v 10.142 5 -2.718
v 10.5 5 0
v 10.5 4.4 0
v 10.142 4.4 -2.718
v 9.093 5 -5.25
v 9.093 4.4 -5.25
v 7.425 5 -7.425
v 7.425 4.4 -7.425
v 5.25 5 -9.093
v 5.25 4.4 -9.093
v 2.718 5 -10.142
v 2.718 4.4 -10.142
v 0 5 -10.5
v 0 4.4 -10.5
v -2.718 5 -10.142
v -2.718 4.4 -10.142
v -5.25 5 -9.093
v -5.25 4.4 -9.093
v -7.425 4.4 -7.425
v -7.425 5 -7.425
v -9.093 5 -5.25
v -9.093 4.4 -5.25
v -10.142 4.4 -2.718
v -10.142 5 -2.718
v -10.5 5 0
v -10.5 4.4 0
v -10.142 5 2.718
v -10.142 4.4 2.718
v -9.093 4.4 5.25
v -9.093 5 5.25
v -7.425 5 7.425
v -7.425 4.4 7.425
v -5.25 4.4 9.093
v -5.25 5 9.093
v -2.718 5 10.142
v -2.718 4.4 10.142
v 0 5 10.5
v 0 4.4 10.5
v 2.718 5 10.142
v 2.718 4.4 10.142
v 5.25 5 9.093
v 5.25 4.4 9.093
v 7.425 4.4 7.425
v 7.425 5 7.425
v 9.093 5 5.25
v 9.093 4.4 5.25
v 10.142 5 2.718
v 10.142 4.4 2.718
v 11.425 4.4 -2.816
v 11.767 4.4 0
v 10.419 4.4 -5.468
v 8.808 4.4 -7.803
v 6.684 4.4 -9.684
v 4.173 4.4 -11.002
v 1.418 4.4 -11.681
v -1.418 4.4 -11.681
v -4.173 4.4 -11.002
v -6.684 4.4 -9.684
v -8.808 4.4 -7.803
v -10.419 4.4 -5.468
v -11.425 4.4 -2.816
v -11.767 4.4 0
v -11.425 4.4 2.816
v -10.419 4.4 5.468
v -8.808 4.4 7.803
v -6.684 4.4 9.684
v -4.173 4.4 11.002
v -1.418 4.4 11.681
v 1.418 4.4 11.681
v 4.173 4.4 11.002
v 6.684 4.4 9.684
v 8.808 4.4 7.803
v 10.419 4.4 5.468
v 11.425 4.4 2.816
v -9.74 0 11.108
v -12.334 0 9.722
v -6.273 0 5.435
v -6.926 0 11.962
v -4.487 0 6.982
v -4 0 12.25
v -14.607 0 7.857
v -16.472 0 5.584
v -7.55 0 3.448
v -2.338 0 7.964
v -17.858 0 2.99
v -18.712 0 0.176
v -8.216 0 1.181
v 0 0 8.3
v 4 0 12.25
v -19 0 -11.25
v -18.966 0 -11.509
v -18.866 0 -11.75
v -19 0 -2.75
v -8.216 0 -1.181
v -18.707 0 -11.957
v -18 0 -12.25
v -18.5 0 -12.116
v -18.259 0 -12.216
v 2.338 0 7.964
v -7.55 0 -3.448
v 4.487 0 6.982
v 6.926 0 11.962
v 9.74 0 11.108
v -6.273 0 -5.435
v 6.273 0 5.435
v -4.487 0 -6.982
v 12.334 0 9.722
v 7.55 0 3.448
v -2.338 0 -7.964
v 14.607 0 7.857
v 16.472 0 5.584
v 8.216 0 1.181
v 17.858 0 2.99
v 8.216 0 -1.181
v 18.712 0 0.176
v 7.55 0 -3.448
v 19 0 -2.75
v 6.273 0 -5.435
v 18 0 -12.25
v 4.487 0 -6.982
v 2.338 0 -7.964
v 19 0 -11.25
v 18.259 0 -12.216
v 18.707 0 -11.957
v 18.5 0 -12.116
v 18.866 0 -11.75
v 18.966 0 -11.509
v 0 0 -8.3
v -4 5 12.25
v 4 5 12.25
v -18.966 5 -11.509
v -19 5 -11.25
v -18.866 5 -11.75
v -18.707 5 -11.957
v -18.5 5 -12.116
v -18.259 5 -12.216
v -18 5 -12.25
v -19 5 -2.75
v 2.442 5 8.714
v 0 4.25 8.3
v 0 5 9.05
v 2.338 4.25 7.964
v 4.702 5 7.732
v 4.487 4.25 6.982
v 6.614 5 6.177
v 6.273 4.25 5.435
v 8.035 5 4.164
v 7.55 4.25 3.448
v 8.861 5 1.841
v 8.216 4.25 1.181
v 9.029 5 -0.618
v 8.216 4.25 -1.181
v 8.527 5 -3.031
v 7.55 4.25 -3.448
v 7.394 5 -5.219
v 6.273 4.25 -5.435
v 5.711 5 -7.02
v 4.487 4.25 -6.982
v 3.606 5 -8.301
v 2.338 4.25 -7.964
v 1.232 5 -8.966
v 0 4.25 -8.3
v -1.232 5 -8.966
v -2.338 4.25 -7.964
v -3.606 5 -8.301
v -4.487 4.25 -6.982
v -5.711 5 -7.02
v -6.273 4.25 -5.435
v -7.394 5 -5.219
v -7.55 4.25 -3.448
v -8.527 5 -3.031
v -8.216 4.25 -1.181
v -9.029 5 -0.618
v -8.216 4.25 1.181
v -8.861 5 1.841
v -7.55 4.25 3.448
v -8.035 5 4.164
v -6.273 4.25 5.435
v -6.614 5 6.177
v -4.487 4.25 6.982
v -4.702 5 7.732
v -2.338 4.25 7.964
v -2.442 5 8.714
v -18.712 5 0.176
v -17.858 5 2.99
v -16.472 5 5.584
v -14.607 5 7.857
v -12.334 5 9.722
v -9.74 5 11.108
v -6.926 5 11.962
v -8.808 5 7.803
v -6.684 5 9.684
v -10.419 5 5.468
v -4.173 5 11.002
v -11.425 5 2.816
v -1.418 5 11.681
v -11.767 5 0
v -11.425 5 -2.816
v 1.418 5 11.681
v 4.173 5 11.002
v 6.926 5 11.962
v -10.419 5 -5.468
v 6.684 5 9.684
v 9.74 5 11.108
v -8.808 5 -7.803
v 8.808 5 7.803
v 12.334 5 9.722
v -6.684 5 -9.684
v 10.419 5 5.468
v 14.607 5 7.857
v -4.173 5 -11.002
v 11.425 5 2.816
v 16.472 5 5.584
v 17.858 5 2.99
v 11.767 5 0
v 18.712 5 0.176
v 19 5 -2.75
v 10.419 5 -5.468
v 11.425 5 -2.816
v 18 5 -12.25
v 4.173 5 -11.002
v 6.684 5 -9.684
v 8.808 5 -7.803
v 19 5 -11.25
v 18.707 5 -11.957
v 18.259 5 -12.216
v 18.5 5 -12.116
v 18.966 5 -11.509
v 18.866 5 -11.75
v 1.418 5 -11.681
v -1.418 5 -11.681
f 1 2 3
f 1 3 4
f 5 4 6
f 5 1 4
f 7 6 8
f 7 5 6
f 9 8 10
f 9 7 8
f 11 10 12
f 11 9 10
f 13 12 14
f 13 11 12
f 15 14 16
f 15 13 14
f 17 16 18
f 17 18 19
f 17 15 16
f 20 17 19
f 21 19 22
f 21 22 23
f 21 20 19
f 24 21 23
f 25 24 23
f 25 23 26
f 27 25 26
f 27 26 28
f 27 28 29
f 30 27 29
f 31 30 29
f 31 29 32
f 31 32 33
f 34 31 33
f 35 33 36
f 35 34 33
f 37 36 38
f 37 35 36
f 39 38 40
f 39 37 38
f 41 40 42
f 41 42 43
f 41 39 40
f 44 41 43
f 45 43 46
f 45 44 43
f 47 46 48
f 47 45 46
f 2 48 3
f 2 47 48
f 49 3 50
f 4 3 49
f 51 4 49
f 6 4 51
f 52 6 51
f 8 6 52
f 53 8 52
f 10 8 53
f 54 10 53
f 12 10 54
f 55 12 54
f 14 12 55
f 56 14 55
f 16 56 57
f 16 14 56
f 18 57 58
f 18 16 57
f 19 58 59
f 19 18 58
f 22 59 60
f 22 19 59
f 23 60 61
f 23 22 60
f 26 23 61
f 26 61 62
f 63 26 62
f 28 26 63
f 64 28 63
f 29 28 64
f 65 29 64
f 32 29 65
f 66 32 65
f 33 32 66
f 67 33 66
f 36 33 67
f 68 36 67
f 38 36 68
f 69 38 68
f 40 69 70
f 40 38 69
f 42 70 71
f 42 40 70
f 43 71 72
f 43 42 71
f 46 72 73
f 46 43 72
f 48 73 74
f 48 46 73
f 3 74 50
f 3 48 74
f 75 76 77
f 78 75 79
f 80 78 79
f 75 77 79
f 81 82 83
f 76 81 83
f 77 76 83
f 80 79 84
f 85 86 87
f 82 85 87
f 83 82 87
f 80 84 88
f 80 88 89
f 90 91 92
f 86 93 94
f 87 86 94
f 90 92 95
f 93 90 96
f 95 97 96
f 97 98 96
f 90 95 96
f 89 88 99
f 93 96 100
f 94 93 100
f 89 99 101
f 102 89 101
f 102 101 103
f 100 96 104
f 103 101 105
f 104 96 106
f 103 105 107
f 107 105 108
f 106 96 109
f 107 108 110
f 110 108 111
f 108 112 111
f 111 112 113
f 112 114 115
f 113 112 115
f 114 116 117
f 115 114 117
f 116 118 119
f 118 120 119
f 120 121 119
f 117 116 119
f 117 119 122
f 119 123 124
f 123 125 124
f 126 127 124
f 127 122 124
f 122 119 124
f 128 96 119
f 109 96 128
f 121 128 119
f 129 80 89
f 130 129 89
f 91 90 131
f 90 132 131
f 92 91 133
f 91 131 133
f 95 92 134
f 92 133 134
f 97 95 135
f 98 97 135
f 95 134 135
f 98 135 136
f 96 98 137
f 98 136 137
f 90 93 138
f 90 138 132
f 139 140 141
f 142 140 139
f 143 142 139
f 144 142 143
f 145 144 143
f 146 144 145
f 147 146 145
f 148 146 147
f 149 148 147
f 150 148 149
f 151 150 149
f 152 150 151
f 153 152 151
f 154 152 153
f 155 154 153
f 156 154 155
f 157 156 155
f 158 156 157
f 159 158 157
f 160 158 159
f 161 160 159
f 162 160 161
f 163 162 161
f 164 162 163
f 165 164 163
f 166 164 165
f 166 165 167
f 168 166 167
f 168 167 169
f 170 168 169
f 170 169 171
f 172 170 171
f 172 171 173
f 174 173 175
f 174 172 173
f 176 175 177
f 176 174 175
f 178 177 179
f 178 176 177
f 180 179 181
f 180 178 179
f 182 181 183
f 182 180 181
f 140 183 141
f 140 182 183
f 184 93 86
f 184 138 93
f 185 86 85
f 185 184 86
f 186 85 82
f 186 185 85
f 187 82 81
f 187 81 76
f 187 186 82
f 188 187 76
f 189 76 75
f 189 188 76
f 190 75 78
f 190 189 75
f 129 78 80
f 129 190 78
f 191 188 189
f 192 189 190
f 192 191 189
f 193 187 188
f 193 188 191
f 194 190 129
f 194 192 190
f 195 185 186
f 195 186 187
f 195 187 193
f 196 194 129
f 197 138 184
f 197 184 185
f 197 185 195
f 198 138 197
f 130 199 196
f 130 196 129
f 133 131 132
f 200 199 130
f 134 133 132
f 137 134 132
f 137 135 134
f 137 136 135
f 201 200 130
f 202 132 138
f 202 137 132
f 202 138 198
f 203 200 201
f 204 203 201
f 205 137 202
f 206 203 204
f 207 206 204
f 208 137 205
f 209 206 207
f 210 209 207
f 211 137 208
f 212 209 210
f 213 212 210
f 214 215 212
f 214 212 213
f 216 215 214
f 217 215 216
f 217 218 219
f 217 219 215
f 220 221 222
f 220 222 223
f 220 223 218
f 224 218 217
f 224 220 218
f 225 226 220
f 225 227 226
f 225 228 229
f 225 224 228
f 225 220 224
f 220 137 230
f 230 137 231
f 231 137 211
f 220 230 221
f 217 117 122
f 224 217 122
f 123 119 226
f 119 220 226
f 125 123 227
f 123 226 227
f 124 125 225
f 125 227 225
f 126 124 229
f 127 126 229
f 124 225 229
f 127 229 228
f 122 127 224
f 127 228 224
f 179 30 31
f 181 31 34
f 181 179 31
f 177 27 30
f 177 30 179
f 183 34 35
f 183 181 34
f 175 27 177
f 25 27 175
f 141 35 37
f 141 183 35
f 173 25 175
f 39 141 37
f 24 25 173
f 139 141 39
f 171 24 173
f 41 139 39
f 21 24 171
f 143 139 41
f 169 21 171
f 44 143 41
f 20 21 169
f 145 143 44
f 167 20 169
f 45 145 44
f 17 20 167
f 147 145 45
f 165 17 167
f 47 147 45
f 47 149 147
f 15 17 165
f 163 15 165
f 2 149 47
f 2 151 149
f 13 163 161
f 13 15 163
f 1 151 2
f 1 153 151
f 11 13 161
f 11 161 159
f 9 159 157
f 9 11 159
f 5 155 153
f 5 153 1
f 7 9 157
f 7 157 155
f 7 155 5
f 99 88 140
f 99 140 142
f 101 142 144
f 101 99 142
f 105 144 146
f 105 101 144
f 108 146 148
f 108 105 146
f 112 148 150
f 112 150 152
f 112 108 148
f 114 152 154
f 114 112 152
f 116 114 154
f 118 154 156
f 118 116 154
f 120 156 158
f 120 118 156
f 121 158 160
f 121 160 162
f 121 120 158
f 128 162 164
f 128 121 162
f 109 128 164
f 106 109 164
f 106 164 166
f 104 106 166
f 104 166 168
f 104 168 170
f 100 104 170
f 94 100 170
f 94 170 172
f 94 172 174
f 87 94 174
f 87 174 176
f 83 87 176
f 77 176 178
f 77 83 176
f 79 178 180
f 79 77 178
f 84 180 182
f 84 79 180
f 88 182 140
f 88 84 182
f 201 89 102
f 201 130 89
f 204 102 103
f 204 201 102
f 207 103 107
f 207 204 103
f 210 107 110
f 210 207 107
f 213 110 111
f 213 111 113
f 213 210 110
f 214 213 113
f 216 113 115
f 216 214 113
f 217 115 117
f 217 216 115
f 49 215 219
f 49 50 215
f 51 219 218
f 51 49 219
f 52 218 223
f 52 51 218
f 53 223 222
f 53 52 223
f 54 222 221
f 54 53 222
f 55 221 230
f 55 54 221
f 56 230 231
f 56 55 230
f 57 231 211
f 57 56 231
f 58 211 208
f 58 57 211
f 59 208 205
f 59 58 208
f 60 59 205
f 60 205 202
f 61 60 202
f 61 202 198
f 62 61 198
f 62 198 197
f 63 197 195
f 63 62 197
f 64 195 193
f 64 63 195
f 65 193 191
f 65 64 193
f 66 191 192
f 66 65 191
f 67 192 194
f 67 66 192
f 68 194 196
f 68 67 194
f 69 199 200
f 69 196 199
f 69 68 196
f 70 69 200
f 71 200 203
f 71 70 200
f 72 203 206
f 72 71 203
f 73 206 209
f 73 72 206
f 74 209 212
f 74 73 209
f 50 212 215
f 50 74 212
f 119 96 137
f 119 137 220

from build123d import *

# Parameters (mm, degrees)
SKETCH1_W           = 38
SKETCH1_H           = 24.5
SKETCH1_R           = 8.3
BOSS_EXTRUDE1_DEPTH = 5
FILLET1_R           = 15
FILLET2_R           = 1
CHAMFER1_SIZE       = 0.75
SKETCH3_W           = 1.267094865
SKETCH3_H           = 1.151259449


with BuildPart() as part:
    # Sketch1 → Boss-Extrude1 (new body)
    with BuildSketch(Plane(origin=(0, 0, 0), x_dir=(1, 0, 0), z_dir=(0, 1, 0))):
        Rectangle(SKETCH1_W, SKETCH1_H)
        with Locations(Location((0, 0, 0), (0, 0, 270))):
            Circle(SKETCH1_R, mode=Mode.SUBTRACT)
    extrude(amount=BOSS_EXTRUDE1_DEPTH)

    # Fillet1
    fillet1_edges = [part.edges().sort_by_distance(p)[0] for p in [
        (19, 2.5, 12.25),
        (-19, 2.5, 12.25),
    ]]
    fillet(fillet1_edges, radius=FILLET1_R)

    # Fillet2
    fillet2_edges = [part.edges().sort_by_distance(p)[0] for p in [
        (-19, 2.5, -12.25),
        (19, 2.5, -12.25),
    ]]
    fillet(fillet2_edges, radius=FILLET2_R)

    # Chamfer1
    chamfer1_edges = [part.edges().sort_by_distance(p)[0] for p in [
        (0, 5, -8.3),
    ]]
    chamfer(chamfer1_edges, length=CHAMFER1_SIZE)

    # o-ring: sweep along a path in Sketch4
    with BuildLine(Plane(origin=(0, 5, 0), x_dir=(1, 0, 0), z_dir=(0, 1, 0))) as o_ring_path:
        CenterArc((0, 0), 11, 0, 360)
    # Sketch3 → o-ring (sweep, cut)
    with BuildSketch(Plane.XY):
        with Locations((-11.133547433, 4.975629725)):
            Rectangle(SKETCH3_W, SKETCH3_H)
    sweep(path=o_ring_path.line, mode=Mode.SUBTRACT)


solid = part.part
